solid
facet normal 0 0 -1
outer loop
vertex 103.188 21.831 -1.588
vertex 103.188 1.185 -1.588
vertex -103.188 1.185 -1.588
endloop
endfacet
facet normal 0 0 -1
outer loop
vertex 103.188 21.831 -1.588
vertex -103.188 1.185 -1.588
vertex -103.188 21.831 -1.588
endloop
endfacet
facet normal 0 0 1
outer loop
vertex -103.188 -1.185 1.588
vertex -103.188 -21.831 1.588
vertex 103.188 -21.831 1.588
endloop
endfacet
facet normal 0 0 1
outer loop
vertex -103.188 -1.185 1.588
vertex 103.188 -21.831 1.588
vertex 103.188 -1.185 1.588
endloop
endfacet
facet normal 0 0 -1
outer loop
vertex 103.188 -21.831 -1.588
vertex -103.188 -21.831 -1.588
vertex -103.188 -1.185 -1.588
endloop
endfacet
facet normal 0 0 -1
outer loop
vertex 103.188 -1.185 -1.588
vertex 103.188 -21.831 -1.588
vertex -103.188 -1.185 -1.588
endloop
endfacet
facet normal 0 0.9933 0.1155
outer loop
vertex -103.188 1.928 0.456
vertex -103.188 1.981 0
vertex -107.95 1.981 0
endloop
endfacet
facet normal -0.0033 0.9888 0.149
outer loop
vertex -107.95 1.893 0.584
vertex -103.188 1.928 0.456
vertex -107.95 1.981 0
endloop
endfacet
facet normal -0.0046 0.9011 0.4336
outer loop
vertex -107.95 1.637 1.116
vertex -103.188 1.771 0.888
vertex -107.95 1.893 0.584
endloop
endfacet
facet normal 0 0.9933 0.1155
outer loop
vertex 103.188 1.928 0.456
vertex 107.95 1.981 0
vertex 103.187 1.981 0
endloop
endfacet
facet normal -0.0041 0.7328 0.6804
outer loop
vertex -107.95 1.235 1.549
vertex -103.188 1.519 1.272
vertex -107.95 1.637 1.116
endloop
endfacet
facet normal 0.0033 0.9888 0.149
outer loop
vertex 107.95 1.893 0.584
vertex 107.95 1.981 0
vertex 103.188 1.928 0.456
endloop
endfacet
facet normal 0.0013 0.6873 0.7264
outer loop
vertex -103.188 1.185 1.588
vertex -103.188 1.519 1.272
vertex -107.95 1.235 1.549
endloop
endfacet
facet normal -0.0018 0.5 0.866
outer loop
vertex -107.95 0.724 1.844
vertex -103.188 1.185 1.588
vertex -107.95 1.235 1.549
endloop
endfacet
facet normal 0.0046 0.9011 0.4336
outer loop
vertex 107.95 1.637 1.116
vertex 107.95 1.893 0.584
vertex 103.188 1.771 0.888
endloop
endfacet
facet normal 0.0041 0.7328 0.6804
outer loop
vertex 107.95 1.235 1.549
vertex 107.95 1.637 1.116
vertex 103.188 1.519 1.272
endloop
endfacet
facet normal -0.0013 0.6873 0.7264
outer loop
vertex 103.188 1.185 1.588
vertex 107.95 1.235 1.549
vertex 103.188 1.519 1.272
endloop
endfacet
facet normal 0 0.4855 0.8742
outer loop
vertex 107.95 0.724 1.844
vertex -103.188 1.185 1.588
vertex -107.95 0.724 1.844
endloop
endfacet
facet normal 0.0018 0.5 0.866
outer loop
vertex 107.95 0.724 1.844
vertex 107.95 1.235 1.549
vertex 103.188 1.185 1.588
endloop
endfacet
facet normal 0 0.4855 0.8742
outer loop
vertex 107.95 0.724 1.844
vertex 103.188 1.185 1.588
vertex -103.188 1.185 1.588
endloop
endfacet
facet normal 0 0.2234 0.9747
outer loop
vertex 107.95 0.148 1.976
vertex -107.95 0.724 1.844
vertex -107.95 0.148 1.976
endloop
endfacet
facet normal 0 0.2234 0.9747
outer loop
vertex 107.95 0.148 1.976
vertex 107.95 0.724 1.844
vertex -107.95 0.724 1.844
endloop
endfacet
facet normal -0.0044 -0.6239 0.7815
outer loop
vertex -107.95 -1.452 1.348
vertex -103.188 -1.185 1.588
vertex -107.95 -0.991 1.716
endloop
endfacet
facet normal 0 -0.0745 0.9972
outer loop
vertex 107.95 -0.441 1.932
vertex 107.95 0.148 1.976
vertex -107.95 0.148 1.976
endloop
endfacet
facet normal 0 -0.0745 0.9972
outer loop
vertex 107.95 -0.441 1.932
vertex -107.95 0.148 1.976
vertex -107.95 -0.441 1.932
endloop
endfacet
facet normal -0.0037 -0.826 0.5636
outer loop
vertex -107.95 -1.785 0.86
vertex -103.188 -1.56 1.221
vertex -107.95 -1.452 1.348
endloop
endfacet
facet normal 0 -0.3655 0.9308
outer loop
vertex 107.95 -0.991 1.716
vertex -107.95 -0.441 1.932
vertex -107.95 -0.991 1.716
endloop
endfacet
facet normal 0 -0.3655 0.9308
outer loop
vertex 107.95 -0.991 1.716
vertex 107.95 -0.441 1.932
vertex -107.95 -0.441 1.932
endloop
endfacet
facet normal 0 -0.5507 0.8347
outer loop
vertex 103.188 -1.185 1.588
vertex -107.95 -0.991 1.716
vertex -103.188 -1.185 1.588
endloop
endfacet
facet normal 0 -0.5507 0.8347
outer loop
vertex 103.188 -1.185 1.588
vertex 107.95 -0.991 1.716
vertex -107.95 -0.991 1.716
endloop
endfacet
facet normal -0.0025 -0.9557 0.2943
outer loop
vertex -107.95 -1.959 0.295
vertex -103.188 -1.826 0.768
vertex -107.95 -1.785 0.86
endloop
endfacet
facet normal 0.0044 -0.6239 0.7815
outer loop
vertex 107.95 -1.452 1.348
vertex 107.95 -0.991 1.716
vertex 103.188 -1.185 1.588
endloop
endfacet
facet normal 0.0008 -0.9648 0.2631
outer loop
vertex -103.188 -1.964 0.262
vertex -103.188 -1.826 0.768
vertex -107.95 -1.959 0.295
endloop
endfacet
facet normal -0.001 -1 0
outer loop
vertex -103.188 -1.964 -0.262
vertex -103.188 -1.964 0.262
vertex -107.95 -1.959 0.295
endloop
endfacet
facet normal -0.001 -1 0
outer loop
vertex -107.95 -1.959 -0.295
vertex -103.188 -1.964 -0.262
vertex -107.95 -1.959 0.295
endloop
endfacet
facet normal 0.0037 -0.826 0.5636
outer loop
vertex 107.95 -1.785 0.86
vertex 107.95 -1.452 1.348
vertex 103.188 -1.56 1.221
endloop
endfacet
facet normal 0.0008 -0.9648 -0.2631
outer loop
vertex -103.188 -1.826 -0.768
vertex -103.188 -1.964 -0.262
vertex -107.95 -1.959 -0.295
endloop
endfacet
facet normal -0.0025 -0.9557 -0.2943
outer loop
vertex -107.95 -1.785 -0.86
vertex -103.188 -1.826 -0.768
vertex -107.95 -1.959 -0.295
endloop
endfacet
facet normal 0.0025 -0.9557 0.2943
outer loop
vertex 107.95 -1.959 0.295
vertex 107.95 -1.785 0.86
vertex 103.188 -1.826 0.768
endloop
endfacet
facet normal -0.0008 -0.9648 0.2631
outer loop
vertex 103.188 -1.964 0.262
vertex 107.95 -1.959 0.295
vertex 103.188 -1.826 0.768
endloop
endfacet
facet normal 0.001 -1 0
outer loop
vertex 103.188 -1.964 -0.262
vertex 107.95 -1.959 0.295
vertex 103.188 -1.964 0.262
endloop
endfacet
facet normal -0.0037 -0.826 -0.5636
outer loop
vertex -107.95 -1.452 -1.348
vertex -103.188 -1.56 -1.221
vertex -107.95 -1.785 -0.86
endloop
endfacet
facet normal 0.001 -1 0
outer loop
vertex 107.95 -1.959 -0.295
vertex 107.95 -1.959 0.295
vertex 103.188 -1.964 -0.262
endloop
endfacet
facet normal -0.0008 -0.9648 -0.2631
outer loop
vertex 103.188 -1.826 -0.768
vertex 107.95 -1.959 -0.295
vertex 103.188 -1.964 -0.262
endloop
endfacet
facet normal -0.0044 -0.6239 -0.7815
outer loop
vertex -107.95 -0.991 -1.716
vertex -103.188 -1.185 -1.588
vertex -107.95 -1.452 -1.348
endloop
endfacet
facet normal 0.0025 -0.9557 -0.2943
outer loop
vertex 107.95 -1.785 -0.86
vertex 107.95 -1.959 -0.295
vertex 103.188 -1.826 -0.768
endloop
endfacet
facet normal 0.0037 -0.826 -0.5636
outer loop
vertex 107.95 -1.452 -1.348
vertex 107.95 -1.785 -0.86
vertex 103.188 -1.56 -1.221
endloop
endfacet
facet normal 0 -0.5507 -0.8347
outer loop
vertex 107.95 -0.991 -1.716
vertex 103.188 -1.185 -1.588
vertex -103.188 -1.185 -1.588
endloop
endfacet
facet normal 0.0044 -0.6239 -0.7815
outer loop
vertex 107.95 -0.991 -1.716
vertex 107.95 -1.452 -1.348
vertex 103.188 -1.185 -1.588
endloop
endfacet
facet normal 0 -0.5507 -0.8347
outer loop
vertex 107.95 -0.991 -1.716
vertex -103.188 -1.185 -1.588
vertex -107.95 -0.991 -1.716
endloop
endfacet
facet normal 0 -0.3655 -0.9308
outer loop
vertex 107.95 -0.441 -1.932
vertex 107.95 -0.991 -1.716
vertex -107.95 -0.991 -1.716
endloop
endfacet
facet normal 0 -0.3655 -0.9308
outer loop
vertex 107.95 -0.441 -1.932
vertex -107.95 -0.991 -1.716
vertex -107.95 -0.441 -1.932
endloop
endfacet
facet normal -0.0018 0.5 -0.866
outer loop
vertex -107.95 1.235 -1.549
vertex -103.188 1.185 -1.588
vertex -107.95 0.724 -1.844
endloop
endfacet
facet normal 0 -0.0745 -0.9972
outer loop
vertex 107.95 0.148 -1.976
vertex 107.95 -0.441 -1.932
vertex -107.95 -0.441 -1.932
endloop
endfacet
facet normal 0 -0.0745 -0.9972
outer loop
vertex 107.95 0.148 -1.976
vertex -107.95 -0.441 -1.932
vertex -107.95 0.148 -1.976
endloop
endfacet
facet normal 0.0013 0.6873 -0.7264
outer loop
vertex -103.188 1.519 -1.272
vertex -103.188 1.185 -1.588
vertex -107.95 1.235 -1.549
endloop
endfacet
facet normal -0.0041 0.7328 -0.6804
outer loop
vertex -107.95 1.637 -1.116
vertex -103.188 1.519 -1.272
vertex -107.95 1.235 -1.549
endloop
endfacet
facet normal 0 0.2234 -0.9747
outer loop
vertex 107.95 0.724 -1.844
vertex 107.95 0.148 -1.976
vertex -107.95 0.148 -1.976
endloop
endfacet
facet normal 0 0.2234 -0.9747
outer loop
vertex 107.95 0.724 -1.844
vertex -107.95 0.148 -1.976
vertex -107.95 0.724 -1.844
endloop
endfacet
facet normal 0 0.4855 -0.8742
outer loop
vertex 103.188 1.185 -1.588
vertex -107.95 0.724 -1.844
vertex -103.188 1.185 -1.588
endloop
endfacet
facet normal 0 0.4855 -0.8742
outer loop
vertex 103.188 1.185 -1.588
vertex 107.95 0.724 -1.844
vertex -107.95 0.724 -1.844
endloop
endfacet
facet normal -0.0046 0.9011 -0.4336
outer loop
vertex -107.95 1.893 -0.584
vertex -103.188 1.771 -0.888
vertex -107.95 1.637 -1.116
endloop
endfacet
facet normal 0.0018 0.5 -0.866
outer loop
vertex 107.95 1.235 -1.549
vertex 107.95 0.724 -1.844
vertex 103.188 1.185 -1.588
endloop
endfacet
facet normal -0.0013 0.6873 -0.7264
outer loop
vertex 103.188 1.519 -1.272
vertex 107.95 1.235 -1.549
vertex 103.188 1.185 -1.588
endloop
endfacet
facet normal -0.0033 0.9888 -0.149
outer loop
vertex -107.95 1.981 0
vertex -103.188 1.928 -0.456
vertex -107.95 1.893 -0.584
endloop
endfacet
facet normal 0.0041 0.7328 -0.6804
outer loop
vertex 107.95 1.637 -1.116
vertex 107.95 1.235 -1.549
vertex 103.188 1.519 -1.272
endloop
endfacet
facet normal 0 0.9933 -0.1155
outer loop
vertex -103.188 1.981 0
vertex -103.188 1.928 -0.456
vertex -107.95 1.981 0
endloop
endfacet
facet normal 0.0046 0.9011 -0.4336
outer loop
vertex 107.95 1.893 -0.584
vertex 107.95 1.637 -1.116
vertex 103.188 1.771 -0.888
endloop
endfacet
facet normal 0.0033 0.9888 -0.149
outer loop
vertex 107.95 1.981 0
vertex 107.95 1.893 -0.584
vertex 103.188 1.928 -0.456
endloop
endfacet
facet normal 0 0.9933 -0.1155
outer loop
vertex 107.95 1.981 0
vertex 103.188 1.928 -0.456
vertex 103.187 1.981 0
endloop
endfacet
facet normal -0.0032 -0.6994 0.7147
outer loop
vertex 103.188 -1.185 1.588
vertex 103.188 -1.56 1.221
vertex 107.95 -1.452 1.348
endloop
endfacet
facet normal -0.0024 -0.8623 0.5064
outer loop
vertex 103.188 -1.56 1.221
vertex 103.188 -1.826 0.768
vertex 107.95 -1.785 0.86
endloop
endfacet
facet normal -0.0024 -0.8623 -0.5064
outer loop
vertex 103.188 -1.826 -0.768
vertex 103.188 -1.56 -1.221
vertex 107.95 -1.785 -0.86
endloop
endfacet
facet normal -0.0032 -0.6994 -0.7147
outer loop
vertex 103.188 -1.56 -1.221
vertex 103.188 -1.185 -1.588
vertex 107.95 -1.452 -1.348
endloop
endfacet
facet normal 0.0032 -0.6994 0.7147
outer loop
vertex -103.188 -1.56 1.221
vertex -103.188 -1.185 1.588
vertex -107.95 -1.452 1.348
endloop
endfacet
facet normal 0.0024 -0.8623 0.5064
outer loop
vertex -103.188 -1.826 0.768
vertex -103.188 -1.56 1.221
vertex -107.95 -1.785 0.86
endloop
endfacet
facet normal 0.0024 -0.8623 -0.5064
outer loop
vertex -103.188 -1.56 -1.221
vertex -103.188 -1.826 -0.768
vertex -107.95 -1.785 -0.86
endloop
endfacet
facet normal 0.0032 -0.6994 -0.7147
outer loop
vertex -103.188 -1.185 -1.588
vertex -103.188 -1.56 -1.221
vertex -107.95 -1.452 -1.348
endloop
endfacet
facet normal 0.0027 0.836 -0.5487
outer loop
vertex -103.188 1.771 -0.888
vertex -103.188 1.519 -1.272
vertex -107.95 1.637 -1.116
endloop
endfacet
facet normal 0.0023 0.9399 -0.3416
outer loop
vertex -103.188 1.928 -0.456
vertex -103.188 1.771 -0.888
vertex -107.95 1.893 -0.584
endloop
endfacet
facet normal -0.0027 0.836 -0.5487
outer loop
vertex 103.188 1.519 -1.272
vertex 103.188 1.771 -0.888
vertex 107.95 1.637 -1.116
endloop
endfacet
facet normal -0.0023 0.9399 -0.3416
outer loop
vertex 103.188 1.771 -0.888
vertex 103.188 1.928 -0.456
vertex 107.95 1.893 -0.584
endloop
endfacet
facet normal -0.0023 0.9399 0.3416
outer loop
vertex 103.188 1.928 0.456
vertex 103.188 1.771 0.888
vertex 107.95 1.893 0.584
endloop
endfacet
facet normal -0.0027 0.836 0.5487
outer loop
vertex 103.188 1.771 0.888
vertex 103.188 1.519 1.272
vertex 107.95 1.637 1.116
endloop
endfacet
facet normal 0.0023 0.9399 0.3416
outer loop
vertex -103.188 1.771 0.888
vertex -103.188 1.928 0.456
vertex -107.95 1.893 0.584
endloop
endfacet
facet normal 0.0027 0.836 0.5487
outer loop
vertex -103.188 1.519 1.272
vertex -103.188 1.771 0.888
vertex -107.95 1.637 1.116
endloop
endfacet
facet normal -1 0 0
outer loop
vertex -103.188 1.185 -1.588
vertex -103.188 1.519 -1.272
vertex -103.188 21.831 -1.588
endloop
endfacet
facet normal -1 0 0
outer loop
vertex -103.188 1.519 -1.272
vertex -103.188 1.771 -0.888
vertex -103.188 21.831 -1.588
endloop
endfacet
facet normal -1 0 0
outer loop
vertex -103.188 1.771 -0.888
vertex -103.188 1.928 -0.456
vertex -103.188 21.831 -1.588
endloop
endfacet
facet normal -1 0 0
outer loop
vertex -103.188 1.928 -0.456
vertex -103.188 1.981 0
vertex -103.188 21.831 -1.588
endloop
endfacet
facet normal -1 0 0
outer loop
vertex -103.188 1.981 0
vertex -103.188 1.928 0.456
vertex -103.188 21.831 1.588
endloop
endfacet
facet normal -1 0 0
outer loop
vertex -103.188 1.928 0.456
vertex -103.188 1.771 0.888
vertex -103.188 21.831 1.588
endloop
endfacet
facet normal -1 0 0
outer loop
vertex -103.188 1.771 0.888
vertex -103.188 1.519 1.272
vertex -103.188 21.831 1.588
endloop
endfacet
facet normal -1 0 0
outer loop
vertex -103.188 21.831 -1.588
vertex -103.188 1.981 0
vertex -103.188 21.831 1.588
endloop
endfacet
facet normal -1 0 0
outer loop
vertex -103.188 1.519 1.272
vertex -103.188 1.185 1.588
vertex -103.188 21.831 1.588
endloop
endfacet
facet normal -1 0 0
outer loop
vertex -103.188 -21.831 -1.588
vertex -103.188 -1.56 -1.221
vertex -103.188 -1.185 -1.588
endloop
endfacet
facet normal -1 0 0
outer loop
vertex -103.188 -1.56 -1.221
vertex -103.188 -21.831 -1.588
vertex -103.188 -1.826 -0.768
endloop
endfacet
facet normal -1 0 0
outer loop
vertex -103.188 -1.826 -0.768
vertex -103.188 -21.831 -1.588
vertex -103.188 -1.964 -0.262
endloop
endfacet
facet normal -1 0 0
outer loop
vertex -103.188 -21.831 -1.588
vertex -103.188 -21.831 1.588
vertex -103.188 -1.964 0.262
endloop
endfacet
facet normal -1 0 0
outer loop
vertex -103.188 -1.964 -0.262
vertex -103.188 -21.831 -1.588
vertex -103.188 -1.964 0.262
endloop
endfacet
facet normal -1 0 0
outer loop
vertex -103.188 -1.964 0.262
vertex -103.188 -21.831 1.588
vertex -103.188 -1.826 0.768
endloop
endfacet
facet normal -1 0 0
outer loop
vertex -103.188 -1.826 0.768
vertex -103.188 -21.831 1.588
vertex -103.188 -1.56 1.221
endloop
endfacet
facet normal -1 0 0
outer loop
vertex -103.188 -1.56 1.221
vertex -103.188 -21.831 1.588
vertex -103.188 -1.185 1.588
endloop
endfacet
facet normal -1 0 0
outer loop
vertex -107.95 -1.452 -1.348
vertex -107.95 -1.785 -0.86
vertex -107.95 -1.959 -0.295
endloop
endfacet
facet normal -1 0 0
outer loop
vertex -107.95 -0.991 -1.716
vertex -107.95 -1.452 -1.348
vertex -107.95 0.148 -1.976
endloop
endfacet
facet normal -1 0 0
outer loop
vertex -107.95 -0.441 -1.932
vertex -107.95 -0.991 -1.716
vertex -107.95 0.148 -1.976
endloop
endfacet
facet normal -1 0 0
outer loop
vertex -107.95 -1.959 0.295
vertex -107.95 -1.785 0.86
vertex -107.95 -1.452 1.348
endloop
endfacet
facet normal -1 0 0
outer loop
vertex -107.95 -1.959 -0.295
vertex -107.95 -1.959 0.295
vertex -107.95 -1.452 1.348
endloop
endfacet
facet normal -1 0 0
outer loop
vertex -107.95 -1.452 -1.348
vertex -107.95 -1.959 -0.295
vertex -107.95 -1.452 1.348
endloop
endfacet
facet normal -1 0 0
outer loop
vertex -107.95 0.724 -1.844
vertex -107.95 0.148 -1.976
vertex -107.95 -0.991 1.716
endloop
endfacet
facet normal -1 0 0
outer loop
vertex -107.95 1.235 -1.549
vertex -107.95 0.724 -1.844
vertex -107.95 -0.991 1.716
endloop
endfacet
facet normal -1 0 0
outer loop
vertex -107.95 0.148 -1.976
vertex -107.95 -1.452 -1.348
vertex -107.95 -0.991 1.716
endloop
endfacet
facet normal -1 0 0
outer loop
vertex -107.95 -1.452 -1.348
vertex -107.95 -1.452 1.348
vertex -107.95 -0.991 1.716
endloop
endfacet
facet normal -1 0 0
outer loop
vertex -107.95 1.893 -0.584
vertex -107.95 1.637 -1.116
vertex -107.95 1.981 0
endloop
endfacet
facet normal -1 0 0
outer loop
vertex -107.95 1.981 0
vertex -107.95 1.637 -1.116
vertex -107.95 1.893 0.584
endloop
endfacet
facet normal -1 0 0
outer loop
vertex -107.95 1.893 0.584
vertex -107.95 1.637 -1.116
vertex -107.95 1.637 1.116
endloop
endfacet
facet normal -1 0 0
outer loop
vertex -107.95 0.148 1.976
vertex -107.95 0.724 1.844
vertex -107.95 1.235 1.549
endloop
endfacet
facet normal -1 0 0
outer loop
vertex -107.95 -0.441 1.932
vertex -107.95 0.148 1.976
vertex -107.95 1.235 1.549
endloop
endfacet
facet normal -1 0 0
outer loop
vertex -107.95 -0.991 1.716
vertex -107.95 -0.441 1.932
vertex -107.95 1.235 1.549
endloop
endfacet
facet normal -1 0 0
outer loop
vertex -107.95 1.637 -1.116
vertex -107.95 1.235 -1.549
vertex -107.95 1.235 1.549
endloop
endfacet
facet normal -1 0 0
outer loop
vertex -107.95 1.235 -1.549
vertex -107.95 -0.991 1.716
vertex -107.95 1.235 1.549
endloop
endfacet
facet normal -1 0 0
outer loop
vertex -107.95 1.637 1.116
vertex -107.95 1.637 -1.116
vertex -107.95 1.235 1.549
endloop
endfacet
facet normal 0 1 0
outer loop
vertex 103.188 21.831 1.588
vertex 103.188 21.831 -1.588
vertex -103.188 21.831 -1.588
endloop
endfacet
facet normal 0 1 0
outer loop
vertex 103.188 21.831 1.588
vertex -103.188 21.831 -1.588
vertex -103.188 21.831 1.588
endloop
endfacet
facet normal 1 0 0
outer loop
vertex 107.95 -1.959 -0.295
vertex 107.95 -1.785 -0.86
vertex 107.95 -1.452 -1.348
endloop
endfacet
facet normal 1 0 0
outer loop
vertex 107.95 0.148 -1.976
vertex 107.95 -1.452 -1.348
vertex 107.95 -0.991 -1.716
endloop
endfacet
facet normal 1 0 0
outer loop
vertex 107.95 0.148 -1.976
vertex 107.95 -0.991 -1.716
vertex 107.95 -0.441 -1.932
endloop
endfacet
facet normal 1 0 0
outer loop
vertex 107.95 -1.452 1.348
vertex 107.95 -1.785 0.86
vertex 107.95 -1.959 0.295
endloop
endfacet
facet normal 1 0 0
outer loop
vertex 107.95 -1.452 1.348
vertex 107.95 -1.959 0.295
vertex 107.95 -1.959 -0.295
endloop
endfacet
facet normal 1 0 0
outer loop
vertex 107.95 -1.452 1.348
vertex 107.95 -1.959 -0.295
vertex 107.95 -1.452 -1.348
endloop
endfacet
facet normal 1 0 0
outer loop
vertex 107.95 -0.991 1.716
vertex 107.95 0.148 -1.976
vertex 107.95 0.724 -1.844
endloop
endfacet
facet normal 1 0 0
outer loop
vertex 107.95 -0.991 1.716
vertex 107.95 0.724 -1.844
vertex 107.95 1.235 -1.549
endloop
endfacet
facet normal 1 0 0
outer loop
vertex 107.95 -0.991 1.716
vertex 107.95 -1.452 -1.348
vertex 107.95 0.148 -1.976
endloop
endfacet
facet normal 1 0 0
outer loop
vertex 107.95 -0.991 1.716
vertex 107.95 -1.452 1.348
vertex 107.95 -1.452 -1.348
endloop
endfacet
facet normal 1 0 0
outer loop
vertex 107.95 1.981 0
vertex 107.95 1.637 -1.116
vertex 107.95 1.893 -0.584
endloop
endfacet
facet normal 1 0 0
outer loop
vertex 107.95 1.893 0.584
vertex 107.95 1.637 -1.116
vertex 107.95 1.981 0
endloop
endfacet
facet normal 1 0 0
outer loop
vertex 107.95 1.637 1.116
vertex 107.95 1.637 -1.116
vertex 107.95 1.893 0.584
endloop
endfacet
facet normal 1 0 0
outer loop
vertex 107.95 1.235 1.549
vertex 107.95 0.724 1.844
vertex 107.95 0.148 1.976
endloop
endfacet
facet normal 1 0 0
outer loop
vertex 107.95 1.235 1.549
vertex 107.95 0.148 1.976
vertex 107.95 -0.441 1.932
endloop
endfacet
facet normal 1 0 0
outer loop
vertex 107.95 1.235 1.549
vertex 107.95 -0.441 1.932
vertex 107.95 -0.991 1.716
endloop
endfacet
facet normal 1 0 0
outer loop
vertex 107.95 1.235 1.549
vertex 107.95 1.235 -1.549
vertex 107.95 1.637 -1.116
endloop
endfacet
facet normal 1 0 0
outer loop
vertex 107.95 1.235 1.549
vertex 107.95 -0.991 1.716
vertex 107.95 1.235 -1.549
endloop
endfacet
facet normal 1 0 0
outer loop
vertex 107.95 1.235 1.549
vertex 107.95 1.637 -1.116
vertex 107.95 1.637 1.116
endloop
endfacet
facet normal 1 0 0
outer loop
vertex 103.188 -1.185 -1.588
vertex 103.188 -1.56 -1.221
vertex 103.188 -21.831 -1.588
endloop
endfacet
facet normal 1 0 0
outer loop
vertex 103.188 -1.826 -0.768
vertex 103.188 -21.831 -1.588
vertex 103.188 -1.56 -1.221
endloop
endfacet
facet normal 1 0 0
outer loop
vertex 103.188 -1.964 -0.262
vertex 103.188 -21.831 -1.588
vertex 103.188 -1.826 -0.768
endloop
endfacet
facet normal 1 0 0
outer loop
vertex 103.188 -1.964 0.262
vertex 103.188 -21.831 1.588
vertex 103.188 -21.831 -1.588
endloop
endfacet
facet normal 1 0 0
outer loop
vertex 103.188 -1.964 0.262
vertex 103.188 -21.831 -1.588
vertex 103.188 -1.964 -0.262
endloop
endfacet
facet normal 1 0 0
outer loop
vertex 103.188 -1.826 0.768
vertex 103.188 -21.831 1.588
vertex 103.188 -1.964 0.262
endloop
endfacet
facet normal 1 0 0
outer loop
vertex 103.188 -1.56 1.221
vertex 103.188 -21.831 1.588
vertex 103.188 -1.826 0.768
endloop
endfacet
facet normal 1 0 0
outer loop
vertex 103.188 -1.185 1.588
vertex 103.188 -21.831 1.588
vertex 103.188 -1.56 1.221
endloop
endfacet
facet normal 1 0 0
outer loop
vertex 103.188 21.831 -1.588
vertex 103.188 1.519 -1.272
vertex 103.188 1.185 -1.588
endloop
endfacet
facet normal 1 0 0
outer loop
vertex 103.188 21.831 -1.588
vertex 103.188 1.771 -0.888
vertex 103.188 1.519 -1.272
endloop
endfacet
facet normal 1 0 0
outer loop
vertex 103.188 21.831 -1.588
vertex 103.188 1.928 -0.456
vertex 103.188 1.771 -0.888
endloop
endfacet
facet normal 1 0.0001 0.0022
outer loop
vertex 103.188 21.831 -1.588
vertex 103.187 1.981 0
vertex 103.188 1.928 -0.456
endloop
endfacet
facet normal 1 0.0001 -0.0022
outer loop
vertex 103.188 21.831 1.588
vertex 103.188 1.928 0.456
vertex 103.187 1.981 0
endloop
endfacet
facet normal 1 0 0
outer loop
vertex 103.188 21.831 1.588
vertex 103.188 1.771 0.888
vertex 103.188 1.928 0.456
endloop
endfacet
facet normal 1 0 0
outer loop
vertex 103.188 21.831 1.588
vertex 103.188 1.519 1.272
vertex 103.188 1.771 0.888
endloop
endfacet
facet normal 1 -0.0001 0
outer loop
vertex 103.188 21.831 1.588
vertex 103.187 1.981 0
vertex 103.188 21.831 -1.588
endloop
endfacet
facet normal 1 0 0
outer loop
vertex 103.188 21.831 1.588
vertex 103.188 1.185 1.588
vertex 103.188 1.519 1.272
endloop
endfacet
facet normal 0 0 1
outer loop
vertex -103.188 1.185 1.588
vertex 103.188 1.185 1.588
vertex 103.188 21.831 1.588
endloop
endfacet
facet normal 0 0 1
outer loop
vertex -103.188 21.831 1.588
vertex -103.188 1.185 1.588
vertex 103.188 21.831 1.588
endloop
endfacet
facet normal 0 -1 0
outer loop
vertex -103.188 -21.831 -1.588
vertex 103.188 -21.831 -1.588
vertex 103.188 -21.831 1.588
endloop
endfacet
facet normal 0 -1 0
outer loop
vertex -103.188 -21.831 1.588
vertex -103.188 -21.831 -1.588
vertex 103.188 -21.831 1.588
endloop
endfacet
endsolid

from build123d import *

# Parameters (mm, degrees)
F1_W     = 43.6626
F1_H     = 3.175
F2_DEPTH = 103.1875
F3_R     = 1.9812
F4_DEPTH = 107.95


# Not quite as in the source:
# - a variable given as a bare number and used for a length is read in inches; the dataset says mm whatever the document's units were


with BuildPart() as f2:
    # F1 (on Right) → F2 (new body, symmetric)
    with BuildSketch(Plane.YZ):
        Rectangle(F1_W, F1_H)
    extrude(amount=F2_DEPTH, both=True)

    # F3 (on Right) → F4 (join, symmetric)
    with BuildSketch(Plane.YZ):
        Circle(F3_R)
    extrude(amount=F4_DEPTH, both=True)


solid = f2.part
